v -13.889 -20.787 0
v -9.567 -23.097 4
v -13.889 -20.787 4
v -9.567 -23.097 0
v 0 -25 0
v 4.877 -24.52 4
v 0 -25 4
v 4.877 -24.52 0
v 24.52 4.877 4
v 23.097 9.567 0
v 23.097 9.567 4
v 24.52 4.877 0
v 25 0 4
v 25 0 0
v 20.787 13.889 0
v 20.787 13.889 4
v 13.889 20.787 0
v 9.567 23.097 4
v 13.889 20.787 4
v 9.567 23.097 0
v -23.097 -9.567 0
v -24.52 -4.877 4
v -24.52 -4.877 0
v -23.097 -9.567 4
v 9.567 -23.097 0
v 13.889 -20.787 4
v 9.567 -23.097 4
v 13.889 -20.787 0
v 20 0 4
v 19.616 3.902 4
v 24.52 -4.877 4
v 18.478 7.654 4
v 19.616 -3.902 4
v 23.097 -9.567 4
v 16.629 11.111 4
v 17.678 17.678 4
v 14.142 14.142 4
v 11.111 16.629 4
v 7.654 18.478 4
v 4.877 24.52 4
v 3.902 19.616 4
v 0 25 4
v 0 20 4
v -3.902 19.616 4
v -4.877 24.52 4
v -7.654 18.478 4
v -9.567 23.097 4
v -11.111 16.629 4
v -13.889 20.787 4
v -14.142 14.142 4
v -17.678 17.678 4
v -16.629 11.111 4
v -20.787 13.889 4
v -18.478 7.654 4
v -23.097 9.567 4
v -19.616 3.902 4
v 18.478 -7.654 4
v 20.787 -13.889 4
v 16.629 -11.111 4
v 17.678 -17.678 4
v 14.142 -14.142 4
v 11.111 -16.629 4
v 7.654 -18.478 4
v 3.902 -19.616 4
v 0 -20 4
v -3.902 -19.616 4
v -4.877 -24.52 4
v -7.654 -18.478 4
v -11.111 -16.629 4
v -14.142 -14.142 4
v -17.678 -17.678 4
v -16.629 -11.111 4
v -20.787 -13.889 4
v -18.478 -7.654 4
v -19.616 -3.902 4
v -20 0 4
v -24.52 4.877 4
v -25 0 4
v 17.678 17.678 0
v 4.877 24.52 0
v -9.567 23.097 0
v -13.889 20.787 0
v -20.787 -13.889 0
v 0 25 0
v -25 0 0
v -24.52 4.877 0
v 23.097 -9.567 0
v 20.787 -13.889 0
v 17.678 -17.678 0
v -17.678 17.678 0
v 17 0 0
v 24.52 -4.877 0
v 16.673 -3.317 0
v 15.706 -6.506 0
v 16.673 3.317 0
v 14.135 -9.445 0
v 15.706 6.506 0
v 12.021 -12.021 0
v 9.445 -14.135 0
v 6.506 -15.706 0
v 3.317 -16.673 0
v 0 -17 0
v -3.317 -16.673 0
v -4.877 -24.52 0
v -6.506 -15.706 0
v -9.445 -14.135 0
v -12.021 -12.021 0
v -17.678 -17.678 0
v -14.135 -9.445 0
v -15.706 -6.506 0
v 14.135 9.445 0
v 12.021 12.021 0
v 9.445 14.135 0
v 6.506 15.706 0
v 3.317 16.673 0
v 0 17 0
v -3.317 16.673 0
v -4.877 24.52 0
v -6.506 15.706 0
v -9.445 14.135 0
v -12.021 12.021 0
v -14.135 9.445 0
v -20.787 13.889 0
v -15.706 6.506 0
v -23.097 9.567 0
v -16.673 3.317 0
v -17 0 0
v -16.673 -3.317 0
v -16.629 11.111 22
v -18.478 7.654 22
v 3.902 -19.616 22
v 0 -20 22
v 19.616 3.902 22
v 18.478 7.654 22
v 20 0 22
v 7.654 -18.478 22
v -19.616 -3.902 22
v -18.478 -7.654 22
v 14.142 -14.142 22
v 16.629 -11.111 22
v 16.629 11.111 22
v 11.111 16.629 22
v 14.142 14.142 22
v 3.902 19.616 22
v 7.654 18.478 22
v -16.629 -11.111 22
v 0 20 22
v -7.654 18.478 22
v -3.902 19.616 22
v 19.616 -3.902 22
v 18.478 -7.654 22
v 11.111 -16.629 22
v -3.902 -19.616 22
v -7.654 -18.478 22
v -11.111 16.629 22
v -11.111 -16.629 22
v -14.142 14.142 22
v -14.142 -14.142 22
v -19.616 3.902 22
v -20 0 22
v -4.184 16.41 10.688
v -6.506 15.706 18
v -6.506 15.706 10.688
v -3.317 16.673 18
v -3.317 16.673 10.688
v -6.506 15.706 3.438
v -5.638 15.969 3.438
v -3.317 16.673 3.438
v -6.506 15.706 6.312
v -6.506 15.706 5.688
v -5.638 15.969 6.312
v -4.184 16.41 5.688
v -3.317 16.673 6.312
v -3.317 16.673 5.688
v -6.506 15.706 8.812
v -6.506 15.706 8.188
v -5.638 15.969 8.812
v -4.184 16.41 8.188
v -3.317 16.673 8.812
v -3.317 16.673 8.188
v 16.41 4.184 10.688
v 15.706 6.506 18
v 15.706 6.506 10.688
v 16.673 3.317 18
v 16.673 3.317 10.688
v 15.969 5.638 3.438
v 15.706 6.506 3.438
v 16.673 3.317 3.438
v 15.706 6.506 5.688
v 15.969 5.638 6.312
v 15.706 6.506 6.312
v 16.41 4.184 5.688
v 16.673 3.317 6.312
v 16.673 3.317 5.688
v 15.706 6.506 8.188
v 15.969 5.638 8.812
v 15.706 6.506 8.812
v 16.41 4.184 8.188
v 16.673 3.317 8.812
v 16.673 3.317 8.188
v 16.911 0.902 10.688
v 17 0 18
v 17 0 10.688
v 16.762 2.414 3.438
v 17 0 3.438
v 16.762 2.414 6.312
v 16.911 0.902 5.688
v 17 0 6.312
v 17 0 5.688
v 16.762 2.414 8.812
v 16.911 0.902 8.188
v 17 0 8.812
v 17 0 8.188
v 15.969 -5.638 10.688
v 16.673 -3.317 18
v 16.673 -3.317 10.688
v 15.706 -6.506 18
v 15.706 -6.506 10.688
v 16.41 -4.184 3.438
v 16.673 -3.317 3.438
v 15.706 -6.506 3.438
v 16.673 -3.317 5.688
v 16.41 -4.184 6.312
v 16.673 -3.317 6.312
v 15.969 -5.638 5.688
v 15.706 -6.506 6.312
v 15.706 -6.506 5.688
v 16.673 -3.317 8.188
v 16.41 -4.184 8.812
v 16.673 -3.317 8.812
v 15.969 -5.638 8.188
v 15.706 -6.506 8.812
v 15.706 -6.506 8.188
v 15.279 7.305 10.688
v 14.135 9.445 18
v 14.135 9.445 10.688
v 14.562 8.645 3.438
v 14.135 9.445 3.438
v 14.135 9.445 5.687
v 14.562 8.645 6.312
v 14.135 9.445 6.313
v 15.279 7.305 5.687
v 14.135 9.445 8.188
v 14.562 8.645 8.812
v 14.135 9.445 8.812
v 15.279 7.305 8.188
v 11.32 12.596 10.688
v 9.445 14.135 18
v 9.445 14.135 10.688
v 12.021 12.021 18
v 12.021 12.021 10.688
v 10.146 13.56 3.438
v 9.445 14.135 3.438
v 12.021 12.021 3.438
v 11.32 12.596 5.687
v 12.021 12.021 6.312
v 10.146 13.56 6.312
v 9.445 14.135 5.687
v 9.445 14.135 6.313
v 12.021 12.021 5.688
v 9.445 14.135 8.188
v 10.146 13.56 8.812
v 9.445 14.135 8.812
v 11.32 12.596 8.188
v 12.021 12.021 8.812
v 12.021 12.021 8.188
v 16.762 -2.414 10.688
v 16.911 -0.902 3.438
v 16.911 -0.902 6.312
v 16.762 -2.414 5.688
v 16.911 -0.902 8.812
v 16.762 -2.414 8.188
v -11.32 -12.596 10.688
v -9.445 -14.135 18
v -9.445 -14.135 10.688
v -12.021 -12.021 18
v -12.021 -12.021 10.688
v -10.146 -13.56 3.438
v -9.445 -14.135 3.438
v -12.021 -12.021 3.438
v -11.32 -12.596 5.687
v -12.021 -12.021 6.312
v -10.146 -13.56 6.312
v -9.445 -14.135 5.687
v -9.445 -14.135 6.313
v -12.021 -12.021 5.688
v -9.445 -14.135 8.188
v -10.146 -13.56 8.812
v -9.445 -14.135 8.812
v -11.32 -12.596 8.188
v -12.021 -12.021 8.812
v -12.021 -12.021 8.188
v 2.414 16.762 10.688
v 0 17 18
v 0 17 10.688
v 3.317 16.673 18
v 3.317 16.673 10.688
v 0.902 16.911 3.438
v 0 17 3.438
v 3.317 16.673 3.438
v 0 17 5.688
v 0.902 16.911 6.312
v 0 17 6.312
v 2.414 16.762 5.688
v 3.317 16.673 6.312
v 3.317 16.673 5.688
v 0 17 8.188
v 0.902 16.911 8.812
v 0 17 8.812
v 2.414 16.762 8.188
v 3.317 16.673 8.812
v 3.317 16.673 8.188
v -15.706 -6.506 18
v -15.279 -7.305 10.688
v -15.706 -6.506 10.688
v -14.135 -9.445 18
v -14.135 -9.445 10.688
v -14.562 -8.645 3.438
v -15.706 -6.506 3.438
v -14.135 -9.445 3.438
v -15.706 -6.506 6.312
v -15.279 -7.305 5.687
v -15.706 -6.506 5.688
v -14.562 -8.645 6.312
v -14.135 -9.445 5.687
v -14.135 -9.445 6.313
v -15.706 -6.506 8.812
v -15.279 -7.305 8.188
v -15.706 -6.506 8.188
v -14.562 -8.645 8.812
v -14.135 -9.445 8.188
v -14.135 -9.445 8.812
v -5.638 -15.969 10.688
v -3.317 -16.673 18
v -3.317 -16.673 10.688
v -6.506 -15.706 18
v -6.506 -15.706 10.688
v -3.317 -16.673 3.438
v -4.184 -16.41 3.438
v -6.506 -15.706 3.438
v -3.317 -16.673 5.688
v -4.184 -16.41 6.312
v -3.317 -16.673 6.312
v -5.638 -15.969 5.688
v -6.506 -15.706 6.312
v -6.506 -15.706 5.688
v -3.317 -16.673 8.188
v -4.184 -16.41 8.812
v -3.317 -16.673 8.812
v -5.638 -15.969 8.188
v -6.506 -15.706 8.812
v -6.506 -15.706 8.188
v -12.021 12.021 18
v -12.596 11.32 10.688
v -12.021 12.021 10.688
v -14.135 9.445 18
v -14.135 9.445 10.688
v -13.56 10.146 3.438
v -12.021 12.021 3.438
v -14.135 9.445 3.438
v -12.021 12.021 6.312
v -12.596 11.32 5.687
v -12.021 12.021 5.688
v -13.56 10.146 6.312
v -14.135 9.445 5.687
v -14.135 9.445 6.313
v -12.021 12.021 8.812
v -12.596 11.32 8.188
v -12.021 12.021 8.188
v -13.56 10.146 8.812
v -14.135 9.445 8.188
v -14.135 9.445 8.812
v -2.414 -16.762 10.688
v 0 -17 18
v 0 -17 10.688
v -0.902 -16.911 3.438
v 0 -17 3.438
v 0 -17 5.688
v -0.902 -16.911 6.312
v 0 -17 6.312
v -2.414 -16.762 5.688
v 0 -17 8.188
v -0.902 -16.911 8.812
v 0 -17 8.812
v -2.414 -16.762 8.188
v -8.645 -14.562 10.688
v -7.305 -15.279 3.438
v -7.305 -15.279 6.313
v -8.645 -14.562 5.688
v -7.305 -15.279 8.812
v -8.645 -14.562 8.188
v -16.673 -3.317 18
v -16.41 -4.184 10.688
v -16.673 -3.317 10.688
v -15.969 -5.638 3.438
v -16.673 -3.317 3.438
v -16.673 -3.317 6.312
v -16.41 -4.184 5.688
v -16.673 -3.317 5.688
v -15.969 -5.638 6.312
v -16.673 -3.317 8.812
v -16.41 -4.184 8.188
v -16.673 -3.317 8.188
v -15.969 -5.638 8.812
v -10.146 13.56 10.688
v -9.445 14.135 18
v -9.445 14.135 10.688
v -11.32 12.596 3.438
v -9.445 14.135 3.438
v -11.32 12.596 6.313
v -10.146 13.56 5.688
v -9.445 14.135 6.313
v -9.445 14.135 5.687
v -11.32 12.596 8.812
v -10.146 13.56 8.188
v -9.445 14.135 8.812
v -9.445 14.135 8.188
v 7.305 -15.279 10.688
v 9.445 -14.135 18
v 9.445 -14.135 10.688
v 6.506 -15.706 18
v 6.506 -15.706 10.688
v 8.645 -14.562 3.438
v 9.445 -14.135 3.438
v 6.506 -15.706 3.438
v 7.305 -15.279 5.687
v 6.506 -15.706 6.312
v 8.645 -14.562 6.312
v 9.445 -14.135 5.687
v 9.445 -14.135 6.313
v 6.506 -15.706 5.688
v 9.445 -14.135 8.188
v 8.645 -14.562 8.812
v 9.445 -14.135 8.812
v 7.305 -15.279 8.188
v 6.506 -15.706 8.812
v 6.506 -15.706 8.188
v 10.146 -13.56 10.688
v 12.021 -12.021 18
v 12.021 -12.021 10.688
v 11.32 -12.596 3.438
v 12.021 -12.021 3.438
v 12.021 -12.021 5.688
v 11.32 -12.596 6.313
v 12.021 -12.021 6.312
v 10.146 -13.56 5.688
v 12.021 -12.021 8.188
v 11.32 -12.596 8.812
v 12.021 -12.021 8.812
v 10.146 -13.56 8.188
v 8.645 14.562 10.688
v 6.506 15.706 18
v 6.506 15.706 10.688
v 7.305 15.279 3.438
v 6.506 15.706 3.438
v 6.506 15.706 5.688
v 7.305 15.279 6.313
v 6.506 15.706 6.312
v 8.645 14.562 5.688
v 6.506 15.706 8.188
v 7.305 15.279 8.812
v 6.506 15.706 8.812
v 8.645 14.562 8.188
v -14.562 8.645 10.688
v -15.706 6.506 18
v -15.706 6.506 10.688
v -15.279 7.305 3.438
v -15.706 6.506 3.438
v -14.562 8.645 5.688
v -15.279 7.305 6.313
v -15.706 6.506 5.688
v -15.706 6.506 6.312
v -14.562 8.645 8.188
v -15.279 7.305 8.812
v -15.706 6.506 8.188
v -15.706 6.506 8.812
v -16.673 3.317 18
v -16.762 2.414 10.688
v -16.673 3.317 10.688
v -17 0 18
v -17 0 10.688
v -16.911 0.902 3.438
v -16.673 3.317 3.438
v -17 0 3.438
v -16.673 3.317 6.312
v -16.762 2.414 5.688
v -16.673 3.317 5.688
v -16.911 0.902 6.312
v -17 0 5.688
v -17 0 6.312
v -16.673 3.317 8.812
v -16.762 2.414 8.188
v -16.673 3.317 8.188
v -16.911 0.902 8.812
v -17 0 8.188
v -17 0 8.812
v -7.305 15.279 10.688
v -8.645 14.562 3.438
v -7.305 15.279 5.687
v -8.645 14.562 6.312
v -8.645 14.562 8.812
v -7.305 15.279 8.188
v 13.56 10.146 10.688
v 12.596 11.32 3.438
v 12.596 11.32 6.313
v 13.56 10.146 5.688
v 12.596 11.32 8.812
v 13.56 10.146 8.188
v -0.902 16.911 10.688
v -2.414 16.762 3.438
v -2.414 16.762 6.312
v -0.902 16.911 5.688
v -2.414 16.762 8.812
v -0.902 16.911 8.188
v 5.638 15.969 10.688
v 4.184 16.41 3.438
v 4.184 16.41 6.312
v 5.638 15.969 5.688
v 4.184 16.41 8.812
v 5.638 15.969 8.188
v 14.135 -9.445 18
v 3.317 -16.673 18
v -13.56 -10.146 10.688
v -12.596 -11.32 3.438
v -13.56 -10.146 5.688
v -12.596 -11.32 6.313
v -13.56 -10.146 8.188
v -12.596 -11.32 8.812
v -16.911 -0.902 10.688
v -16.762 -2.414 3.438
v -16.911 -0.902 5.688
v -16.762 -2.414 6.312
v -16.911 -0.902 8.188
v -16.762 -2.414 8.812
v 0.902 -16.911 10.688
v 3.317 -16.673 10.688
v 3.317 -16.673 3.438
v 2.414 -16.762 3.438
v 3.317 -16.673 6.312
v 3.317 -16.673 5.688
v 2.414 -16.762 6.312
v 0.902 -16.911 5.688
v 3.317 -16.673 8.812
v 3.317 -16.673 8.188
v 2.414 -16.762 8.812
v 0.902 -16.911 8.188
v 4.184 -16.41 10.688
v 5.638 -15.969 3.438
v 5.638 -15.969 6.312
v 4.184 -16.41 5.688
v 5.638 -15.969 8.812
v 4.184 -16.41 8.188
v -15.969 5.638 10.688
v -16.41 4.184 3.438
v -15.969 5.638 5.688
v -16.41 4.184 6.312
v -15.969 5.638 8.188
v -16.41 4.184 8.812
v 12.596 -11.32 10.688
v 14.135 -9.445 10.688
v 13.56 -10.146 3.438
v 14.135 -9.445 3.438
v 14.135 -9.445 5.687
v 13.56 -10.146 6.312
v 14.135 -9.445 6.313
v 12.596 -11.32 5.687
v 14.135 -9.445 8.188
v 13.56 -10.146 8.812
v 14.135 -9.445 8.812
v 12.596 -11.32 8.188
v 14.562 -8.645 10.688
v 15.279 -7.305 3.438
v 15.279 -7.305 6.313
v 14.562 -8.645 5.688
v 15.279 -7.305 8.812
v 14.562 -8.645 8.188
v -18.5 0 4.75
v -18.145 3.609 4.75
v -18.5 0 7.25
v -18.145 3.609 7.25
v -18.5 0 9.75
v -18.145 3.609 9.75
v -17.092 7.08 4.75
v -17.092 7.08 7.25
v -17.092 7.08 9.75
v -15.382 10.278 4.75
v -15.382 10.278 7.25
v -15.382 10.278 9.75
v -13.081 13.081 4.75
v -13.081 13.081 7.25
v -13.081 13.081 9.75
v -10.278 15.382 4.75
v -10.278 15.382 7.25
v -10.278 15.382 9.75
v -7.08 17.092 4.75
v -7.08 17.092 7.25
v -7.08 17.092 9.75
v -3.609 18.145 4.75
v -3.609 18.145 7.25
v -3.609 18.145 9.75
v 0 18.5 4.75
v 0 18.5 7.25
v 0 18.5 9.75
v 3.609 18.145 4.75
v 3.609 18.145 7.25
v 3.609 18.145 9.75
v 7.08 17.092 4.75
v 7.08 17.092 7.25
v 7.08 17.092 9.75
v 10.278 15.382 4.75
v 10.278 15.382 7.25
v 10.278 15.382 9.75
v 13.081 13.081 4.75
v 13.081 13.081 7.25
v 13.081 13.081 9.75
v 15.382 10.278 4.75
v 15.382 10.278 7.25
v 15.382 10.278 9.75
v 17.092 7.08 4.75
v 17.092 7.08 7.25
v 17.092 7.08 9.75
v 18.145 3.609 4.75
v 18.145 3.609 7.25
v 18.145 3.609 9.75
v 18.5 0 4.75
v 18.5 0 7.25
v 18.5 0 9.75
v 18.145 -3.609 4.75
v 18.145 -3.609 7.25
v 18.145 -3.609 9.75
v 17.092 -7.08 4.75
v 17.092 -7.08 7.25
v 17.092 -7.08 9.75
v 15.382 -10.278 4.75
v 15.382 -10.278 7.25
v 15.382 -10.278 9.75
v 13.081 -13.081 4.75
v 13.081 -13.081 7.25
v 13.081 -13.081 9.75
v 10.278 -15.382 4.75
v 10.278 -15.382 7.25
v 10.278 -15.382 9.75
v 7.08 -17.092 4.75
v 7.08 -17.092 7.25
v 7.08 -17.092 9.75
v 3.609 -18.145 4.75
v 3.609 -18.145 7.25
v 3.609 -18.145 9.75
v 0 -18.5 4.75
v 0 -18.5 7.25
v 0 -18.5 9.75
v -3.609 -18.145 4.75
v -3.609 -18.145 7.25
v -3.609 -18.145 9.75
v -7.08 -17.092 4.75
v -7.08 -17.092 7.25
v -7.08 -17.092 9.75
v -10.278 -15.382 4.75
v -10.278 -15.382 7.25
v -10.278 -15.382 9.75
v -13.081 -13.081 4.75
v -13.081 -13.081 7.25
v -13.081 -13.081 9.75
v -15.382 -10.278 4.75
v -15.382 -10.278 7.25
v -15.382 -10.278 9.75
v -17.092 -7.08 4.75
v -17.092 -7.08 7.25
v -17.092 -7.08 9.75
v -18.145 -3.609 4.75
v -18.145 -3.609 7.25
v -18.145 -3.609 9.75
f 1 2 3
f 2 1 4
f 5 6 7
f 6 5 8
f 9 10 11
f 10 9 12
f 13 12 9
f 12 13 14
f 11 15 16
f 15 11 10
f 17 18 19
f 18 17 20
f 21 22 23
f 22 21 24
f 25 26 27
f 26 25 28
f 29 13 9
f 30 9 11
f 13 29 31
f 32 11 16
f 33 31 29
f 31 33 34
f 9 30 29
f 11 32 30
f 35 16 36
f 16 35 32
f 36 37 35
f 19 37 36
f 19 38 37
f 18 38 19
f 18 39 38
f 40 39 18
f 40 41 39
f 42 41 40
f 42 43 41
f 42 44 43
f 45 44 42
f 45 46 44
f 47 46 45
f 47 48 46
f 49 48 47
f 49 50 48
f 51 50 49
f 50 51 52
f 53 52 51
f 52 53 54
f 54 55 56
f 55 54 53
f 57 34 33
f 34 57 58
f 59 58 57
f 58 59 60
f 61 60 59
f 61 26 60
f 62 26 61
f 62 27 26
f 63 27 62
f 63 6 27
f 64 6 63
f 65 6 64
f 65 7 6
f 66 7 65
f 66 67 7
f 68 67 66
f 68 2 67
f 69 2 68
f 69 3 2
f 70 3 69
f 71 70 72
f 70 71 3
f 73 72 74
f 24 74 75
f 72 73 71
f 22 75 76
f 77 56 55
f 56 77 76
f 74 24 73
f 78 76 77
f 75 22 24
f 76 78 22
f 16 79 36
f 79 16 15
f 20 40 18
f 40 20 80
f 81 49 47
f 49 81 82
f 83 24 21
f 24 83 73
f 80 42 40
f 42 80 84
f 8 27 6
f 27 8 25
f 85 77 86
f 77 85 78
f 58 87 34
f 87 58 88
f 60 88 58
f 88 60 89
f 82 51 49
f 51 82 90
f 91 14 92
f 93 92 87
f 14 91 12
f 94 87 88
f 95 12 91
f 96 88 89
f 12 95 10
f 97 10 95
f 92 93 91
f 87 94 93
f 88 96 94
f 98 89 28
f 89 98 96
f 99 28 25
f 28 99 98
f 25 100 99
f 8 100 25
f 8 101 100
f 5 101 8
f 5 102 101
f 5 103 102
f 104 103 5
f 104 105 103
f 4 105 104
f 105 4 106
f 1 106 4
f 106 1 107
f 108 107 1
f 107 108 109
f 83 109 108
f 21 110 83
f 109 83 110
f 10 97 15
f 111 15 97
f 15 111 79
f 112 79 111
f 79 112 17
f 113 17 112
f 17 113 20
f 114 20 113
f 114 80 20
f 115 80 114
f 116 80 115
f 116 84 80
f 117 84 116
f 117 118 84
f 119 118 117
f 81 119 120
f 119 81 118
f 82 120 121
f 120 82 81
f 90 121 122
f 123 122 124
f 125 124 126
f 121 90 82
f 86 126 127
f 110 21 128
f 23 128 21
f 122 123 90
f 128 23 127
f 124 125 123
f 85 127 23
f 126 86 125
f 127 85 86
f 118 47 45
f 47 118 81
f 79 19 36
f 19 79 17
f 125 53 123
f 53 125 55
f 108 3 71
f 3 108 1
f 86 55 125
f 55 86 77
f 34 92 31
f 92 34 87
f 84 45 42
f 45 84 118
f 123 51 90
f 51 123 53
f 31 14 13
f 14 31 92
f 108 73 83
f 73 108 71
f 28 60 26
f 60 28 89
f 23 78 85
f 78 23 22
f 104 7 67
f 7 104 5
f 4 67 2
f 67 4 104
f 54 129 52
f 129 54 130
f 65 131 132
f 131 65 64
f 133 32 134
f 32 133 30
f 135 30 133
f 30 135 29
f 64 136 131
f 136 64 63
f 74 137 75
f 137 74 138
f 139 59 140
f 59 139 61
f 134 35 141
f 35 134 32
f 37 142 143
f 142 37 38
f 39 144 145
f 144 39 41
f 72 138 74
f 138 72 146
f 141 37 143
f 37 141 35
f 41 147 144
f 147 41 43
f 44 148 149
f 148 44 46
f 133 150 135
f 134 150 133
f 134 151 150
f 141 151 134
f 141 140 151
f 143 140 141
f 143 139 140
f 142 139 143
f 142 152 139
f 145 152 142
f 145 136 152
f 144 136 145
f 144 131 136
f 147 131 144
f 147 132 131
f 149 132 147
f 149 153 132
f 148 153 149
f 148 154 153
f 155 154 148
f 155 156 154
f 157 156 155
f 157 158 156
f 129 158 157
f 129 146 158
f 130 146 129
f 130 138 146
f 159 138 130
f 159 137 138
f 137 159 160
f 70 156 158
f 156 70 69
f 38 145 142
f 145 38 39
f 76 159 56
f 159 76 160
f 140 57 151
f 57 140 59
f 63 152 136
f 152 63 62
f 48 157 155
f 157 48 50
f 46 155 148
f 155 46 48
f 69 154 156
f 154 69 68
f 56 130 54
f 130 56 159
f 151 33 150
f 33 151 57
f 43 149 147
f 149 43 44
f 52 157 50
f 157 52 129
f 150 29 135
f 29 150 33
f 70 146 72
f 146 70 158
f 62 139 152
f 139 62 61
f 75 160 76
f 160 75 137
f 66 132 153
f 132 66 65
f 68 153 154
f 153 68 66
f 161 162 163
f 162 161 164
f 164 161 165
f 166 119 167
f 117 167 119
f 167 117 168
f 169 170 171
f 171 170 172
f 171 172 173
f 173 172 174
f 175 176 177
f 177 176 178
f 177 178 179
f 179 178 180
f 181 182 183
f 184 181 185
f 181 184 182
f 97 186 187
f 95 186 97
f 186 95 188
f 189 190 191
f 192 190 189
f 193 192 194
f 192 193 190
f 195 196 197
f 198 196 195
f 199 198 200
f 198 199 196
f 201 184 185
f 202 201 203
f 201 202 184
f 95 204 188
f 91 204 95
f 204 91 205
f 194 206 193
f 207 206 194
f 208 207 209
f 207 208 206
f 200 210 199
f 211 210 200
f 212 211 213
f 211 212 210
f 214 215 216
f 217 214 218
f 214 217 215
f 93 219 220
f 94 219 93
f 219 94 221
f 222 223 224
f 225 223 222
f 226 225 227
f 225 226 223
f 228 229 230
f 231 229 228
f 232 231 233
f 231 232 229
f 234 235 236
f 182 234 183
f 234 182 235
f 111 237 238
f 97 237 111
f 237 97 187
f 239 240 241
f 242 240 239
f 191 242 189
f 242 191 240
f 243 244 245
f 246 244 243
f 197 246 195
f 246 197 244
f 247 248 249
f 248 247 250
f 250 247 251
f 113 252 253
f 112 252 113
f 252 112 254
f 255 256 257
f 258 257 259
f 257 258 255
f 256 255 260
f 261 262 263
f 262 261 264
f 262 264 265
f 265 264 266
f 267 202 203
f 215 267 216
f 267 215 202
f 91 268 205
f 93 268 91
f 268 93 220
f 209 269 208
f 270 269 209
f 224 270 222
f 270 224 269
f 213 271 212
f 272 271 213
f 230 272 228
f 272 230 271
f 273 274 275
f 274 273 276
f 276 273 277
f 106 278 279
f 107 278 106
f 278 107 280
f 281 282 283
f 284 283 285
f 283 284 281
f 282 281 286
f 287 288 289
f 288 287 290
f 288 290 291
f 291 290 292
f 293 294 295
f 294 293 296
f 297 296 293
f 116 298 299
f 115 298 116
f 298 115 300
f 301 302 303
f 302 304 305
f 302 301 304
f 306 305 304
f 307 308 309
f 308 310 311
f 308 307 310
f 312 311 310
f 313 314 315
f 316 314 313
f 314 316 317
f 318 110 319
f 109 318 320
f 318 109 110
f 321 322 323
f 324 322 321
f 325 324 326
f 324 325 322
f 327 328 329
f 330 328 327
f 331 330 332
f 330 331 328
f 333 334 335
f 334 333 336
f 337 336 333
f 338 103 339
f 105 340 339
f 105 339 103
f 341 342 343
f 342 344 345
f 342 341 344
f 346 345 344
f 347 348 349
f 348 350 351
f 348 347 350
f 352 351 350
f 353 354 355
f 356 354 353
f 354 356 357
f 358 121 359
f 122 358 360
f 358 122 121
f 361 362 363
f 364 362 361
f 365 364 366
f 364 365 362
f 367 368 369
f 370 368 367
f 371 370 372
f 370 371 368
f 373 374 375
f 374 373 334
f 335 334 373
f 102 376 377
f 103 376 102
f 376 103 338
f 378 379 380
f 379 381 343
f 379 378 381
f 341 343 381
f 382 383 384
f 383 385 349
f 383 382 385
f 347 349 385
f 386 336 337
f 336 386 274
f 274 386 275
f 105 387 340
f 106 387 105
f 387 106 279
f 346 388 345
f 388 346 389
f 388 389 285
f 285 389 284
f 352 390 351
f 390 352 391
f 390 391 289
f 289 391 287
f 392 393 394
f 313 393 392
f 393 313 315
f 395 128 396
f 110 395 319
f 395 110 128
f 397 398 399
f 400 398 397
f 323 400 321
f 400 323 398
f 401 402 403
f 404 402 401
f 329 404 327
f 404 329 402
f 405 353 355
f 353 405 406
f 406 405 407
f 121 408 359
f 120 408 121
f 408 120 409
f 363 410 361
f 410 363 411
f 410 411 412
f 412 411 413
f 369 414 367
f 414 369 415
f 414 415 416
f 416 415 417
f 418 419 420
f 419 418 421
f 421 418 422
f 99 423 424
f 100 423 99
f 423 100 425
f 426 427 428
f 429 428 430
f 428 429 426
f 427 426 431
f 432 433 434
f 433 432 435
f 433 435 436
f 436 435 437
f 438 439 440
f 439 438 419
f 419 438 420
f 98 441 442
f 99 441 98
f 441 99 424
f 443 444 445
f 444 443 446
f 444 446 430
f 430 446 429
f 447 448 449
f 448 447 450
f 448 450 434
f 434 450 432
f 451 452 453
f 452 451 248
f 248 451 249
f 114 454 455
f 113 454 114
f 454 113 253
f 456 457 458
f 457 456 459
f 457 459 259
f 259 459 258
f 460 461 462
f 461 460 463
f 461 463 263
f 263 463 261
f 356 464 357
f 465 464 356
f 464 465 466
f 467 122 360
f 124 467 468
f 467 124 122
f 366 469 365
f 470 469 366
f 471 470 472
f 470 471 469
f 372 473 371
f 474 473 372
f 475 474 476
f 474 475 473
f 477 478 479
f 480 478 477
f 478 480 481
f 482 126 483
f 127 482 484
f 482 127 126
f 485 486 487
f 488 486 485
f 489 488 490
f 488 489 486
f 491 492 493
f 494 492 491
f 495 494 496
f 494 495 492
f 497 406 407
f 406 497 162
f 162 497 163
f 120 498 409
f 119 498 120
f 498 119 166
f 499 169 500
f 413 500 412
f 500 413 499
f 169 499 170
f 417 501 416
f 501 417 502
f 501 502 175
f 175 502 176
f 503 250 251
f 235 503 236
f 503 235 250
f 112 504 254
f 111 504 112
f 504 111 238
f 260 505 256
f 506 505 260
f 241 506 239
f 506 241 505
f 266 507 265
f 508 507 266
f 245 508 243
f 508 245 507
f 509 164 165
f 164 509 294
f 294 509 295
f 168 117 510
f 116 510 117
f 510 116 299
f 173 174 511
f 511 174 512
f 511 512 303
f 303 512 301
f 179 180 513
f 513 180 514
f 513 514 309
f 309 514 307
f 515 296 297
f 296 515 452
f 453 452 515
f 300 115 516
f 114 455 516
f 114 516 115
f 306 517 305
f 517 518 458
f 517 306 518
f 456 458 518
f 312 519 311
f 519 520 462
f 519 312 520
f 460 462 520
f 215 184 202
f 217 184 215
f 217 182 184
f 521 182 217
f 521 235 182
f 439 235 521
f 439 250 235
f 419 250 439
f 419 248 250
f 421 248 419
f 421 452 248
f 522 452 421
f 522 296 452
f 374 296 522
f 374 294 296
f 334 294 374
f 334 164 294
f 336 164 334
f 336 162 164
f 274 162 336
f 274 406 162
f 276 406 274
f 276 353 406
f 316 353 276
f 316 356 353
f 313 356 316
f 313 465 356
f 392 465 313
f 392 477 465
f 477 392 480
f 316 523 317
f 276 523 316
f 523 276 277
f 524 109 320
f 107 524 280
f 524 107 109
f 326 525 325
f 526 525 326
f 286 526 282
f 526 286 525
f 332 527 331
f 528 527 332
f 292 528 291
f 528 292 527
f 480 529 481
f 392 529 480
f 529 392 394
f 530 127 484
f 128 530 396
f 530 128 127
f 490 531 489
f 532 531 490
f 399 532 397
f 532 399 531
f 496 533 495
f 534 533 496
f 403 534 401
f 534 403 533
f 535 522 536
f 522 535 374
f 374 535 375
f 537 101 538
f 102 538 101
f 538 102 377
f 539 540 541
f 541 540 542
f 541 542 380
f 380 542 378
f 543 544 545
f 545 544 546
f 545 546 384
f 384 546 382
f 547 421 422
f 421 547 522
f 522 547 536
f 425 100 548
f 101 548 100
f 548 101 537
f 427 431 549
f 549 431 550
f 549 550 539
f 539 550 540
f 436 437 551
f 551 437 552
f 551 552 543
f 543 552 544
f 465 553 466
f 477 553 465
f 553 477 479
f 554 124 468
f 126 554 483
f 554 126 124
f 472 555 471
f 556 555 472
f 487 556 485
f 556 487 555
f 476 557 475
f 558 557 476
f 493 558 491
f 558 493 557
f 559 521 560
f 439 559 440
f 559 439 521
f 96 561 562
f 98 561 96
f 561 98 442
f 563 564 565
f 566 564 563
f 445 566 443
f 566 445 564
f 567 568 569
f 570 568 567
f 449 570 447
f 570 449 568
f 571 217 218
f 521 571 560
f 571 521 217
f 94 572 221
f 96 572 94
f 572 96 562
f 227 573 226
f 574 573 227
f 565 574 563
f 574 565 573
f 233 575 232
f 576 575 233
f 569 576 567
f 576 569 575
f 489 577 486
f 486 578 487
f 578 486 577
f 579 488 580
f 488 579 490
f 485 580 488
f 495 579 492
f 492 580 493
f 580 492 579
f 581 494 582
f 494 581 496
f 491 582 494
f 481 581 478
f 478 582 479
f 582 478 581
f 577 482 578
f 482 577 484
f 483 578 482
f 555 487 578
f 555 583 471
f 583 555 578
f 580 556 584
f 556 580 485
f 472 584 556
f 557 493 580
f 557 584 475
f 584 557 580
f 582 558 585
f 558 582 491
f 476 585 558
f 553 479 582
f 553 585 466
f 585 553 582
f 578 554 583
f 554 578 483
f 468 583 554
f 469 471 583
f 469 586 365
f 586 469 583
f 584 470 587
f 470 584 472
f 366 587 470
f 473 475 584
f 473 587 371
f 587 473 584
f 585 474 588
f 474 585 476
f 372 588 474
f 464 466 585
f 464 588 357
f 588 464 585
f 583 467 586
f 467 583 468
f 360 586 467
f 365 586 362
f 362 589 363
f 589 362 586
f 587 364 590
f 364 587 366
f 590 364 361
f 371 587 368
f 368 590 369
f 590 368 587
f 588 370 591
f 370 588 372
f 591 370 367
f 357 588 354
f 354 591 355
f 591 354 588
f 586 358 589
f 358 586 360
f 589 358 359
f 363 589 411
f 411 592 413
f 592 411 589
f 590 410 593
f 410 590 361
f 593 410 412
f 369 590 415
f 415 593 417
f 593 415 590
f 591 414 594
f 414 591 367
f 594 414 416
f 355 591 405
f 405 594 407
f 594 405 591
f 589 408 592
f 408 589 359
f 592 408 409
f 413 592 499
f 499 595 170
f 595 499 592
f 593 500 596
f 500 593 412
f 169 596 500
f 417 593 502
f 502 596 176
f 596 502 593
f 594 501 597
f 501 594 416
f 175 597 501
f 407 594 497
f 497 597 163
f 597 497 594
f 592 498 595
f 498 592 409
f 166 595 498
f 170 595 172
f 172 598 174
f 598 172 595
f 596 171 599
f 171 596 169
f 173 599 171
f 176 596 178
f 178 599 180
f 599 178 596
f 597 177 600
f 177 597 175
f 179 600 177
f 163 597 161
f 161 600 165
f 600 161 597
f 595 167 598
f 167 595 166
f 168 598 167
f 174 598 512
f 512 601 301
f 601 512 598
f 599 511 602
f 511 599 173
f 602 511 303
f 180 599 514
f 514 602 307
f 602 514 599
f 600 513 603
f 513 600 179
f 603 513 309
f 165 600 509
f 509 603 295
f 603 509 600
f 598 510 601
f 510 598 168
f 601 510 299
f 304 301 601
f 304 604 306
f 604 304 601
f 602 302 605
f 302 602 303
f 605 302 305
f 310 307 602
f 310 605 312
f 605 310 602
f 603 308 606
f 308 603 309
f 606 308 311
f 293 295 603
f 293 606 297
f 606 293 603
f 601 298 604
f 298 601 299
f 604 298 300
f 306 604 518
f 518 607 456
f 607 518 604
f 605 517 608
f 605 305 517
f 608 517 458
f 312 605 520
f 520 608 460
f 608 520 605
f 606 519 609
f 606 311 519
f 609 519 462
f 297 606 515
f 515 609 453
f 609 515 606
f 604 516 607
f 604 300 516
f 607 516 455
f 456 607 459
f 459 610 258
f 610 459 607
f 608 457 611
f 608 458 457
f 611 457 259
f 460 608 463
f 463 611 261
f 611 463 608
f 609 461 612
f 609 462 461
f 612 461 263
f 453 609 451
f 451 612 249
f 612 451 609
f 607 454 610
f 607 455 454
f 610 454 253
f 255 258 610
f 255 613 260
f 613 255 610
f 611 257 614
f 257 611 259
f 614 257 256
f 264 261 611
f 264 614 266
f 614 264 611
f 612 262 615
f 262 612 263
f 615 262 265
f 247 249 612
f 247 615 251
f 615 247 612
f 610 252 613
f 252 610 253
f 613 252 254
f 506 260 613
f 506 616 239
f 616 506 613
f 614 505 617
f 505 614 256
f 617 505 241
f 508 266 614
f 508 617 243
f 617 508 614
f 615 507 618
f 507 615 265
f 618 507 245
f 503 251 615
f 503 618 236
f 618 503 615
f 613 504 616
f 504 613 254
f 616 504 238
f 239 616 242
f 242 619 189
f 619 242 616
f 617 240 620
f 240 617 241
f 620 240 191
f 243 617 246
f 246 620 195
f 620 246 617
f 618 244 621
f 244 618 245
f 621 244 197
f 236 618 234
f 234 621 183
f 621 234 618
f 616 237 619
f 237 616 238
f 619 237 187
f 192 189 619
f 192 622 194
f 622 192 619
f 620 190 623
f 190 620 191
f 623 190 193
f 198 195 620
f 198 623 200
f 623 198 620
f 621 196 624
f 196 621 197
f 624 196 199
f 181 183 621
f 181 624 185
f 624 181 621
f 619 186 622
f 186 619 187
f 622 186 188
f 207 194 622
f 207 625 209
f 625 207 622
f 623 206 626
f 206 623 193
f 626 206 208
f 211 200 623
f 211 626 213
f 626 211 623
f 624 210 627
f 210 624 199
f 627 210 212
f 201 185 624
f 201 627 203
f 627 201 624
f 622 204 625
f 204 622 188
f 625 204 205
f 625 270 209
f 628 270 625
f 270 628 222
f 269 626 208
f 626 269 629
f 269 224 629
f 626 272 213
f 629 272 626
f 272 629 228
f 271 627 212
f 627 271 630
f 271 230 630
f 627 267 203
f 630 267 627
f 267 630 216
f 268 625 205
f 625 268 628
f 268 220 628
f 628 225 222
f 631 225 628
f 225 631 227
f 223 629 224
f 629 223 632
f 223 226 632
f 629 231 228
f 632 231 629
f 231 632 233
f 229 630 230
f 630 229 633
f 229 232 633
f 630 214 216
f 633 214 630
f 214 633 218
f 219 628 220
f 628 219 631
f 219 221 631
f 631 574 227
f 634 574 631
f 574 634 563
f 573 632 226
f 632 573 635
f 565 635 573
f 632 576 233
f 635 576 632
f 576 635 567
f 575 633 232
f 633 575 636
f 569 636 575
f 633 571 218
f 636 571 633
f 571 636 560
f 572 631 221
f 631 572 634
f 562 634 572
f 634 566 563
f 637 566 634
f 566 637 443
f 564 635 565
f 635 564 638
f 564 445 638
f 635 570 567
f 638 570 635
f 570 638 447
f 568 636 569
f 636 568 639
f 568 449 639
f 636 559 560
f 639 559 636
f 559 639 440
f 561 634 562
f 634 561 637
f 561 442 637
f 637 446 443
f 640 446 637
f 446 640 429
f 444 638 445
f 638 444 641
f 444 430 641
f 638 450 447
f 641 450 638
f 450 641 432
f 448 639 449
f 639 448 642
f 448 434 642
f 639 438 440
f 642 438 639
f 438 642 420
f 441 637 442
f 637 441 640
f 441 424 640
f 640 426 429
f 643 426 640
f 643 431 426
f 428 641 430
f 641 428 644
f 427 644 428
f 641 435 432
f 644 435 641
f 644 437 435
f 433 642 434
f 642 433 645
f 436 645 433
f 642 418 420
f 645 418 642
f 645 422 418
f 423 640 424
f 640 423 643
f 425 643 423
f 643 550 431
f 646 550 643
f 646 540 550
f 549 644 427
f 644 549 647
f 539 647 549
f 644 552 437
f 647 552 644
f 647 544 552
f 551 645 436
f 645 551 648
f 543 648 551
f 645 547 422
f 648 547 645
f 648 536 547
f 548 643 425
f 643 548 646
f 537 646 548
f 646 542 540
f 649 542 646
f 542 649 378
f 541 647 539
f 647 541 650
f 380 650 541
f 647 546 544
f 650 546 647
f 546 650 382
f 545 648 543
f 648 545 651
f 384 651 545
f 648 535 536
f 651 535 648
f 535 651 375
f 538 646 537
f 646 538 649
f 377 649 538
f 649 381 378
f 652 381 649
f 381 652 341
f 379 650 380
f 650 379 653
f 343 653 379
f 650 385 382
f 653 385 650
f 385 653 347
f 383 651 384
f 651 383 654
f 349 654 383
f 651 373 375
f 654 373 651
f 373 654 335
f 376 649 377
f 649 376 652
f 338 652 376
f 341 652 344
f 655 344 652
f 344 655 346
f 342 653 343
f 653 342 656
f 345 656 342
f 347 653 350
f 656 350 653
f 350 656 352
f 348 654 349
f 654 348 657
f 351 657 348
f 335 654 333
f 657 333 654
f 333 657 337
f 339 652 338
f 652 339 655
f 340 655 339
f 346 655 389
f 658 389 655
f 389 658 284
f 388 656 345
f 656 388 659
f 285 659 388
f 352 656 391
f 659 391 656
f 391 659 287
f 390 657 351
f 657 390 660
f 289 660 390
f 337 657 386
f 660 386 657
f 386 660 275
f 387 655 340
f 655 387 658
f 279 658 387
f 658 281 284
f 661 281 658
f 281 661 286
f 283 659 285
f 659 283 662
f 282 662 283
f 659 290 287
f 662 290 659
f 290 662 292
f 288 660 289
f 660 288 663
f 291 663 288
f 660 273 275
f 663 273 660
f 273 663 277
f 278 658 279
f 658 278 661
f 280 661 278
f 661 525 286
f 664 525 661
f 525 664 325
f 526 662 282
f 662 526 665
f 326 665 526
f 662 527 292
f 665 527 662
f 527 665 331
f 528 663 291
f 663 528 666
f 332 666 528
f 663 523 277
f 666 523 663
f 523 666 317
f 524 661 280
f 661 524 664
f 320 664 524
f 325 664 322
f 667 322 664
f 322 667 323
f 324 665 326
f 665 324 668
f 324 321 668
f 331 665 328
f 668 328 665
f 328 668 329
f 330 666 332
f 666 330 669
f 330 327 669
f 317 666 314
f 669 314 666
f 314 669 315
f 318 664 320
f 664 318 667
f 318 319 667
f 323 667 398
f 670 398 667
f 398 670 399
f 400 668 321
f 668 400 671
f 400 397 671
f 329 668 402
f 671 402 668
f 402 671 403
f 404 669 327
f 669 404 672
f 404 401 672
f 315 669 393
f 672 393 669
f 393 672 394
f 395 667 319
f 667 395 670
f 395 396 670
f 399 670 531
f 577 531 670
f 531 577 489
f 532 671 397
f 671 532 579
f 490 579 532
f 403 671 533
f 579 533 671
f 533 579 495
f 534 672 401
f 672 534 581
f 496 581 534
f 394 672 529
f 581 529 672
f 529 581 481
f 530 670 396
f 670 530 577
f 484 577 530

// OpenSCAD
$fn = 32;

// ----------------------------------------------------------------------
// Threaded cap: 40 mm body, 18 mm tall, 34 mm threaded bore
// ----------------------------------------------------------------------

// --- parameters (mm) ---
outer_d = 40;             // cap outside diameter
body_h = 18;              // cap height
top_t = 4;                // closed top thickness
bore_d = 34;              // bore core diameter
pitch = 2.5;              // thread pitch
thread_d = 1.5;           // thread depth
thread_z = 3;             // thread start above the rim
thread_h = 8;             // threaded height
flange_d = 50;            // flange diameter
flange_t = 4;             // flange thickness

difference() {
  union() {
    cylinder(h = 4, d = flange_d);
    translate([0, 0, 3.5]) cylinder(h = 18.5, d = outer_d);
  }
  /* threaded bore, closed at the top */
  translate([0, 0, -2.5]) cylinder(h = 20.5, d = bore_d);
  translate([0, 0, 3]) rotate_extrude() polygon([[16, 0], [16, 8], [16.5, 8], [18.5, 6.75], [16.5, 5.5], [18.5, 4.25], [16.5, 3], [18.5, 1.75], [16.5, 0], [16, 0]]);
}
